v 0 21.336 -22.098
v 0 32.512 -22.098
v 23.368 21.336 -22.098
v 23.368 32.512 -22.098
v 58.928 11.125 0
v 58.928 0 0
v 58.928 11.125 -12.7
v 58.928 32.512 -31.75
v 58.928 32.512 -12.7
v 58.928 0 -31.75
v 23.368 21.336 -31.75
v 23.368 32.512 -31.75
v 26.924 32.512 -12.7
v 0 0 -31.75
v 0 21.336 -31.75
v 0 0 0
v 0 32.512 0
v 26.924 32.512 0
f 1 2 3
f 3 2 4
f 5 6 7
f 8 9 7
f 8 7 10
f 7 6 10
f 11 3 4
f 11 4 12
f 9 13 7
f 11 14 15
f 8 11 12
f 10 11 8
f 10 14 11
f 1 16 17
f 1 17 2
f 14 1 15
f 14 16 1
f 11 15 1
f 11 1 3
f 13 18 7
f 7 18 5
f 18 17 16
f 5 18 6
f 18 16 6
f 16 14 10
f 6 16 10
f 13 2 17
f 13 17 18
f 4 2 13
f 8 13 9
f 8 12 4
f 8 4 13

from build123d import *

# Parameters (mm, degrees)
SKETCH1_W           = 58.928
SKETCH1_H           = 31.75
BOSS_EXTRUDE1_DEPTH = 32.512
CUT_EXTRUDE1_DEPTH  = 12.7
SKETCH4_W           = 23.368
SKETCH4_H           = 9.652
CUT_EXTRUDE2_DEPTH  = 11.176


with BuildPart() as part:
    # Sketch1 → Boss-Extrude1 (new body)
    with BuildSketch(Plane(origin=(0, 0, 0), x_dir=(1, 0, 0), z_dir=(0, 1, 0))):
        with Locations((29.464, 15.875)):
            Rectangle(SKETCH1_W, SKETCH1_H)
    extrude(amount=BOSS_EXTRUDE1_DEPTH)

    # Sketch3 → Cut-Extrude1 (cut)
    with BuildSketch(Plane.XY):
        Polygon((26.924, 32.512), (58.928, 11.1252), (58.928, 32.512), align=None)
    extrude(amount=-CUT_EXTRUDE1_DEPTH, mode=Mode.SUBTRACT)

    # Sketch4 → Cut-Extrude2 (cut)
    with BuildSketch(Plane(origin=(0, 32.512, 0), x_dir=(1, 0, 0), z_dir=(0, 1, 0))):
        with Locations((11.684, 26.924)):
            Rectangle(SKETCH4_W, SKETCH4_H)
    extrude(amount=-CUT_EXTRUDE2_DEPTH, mode=Mode.SUBTRACT)


solid = part.part
